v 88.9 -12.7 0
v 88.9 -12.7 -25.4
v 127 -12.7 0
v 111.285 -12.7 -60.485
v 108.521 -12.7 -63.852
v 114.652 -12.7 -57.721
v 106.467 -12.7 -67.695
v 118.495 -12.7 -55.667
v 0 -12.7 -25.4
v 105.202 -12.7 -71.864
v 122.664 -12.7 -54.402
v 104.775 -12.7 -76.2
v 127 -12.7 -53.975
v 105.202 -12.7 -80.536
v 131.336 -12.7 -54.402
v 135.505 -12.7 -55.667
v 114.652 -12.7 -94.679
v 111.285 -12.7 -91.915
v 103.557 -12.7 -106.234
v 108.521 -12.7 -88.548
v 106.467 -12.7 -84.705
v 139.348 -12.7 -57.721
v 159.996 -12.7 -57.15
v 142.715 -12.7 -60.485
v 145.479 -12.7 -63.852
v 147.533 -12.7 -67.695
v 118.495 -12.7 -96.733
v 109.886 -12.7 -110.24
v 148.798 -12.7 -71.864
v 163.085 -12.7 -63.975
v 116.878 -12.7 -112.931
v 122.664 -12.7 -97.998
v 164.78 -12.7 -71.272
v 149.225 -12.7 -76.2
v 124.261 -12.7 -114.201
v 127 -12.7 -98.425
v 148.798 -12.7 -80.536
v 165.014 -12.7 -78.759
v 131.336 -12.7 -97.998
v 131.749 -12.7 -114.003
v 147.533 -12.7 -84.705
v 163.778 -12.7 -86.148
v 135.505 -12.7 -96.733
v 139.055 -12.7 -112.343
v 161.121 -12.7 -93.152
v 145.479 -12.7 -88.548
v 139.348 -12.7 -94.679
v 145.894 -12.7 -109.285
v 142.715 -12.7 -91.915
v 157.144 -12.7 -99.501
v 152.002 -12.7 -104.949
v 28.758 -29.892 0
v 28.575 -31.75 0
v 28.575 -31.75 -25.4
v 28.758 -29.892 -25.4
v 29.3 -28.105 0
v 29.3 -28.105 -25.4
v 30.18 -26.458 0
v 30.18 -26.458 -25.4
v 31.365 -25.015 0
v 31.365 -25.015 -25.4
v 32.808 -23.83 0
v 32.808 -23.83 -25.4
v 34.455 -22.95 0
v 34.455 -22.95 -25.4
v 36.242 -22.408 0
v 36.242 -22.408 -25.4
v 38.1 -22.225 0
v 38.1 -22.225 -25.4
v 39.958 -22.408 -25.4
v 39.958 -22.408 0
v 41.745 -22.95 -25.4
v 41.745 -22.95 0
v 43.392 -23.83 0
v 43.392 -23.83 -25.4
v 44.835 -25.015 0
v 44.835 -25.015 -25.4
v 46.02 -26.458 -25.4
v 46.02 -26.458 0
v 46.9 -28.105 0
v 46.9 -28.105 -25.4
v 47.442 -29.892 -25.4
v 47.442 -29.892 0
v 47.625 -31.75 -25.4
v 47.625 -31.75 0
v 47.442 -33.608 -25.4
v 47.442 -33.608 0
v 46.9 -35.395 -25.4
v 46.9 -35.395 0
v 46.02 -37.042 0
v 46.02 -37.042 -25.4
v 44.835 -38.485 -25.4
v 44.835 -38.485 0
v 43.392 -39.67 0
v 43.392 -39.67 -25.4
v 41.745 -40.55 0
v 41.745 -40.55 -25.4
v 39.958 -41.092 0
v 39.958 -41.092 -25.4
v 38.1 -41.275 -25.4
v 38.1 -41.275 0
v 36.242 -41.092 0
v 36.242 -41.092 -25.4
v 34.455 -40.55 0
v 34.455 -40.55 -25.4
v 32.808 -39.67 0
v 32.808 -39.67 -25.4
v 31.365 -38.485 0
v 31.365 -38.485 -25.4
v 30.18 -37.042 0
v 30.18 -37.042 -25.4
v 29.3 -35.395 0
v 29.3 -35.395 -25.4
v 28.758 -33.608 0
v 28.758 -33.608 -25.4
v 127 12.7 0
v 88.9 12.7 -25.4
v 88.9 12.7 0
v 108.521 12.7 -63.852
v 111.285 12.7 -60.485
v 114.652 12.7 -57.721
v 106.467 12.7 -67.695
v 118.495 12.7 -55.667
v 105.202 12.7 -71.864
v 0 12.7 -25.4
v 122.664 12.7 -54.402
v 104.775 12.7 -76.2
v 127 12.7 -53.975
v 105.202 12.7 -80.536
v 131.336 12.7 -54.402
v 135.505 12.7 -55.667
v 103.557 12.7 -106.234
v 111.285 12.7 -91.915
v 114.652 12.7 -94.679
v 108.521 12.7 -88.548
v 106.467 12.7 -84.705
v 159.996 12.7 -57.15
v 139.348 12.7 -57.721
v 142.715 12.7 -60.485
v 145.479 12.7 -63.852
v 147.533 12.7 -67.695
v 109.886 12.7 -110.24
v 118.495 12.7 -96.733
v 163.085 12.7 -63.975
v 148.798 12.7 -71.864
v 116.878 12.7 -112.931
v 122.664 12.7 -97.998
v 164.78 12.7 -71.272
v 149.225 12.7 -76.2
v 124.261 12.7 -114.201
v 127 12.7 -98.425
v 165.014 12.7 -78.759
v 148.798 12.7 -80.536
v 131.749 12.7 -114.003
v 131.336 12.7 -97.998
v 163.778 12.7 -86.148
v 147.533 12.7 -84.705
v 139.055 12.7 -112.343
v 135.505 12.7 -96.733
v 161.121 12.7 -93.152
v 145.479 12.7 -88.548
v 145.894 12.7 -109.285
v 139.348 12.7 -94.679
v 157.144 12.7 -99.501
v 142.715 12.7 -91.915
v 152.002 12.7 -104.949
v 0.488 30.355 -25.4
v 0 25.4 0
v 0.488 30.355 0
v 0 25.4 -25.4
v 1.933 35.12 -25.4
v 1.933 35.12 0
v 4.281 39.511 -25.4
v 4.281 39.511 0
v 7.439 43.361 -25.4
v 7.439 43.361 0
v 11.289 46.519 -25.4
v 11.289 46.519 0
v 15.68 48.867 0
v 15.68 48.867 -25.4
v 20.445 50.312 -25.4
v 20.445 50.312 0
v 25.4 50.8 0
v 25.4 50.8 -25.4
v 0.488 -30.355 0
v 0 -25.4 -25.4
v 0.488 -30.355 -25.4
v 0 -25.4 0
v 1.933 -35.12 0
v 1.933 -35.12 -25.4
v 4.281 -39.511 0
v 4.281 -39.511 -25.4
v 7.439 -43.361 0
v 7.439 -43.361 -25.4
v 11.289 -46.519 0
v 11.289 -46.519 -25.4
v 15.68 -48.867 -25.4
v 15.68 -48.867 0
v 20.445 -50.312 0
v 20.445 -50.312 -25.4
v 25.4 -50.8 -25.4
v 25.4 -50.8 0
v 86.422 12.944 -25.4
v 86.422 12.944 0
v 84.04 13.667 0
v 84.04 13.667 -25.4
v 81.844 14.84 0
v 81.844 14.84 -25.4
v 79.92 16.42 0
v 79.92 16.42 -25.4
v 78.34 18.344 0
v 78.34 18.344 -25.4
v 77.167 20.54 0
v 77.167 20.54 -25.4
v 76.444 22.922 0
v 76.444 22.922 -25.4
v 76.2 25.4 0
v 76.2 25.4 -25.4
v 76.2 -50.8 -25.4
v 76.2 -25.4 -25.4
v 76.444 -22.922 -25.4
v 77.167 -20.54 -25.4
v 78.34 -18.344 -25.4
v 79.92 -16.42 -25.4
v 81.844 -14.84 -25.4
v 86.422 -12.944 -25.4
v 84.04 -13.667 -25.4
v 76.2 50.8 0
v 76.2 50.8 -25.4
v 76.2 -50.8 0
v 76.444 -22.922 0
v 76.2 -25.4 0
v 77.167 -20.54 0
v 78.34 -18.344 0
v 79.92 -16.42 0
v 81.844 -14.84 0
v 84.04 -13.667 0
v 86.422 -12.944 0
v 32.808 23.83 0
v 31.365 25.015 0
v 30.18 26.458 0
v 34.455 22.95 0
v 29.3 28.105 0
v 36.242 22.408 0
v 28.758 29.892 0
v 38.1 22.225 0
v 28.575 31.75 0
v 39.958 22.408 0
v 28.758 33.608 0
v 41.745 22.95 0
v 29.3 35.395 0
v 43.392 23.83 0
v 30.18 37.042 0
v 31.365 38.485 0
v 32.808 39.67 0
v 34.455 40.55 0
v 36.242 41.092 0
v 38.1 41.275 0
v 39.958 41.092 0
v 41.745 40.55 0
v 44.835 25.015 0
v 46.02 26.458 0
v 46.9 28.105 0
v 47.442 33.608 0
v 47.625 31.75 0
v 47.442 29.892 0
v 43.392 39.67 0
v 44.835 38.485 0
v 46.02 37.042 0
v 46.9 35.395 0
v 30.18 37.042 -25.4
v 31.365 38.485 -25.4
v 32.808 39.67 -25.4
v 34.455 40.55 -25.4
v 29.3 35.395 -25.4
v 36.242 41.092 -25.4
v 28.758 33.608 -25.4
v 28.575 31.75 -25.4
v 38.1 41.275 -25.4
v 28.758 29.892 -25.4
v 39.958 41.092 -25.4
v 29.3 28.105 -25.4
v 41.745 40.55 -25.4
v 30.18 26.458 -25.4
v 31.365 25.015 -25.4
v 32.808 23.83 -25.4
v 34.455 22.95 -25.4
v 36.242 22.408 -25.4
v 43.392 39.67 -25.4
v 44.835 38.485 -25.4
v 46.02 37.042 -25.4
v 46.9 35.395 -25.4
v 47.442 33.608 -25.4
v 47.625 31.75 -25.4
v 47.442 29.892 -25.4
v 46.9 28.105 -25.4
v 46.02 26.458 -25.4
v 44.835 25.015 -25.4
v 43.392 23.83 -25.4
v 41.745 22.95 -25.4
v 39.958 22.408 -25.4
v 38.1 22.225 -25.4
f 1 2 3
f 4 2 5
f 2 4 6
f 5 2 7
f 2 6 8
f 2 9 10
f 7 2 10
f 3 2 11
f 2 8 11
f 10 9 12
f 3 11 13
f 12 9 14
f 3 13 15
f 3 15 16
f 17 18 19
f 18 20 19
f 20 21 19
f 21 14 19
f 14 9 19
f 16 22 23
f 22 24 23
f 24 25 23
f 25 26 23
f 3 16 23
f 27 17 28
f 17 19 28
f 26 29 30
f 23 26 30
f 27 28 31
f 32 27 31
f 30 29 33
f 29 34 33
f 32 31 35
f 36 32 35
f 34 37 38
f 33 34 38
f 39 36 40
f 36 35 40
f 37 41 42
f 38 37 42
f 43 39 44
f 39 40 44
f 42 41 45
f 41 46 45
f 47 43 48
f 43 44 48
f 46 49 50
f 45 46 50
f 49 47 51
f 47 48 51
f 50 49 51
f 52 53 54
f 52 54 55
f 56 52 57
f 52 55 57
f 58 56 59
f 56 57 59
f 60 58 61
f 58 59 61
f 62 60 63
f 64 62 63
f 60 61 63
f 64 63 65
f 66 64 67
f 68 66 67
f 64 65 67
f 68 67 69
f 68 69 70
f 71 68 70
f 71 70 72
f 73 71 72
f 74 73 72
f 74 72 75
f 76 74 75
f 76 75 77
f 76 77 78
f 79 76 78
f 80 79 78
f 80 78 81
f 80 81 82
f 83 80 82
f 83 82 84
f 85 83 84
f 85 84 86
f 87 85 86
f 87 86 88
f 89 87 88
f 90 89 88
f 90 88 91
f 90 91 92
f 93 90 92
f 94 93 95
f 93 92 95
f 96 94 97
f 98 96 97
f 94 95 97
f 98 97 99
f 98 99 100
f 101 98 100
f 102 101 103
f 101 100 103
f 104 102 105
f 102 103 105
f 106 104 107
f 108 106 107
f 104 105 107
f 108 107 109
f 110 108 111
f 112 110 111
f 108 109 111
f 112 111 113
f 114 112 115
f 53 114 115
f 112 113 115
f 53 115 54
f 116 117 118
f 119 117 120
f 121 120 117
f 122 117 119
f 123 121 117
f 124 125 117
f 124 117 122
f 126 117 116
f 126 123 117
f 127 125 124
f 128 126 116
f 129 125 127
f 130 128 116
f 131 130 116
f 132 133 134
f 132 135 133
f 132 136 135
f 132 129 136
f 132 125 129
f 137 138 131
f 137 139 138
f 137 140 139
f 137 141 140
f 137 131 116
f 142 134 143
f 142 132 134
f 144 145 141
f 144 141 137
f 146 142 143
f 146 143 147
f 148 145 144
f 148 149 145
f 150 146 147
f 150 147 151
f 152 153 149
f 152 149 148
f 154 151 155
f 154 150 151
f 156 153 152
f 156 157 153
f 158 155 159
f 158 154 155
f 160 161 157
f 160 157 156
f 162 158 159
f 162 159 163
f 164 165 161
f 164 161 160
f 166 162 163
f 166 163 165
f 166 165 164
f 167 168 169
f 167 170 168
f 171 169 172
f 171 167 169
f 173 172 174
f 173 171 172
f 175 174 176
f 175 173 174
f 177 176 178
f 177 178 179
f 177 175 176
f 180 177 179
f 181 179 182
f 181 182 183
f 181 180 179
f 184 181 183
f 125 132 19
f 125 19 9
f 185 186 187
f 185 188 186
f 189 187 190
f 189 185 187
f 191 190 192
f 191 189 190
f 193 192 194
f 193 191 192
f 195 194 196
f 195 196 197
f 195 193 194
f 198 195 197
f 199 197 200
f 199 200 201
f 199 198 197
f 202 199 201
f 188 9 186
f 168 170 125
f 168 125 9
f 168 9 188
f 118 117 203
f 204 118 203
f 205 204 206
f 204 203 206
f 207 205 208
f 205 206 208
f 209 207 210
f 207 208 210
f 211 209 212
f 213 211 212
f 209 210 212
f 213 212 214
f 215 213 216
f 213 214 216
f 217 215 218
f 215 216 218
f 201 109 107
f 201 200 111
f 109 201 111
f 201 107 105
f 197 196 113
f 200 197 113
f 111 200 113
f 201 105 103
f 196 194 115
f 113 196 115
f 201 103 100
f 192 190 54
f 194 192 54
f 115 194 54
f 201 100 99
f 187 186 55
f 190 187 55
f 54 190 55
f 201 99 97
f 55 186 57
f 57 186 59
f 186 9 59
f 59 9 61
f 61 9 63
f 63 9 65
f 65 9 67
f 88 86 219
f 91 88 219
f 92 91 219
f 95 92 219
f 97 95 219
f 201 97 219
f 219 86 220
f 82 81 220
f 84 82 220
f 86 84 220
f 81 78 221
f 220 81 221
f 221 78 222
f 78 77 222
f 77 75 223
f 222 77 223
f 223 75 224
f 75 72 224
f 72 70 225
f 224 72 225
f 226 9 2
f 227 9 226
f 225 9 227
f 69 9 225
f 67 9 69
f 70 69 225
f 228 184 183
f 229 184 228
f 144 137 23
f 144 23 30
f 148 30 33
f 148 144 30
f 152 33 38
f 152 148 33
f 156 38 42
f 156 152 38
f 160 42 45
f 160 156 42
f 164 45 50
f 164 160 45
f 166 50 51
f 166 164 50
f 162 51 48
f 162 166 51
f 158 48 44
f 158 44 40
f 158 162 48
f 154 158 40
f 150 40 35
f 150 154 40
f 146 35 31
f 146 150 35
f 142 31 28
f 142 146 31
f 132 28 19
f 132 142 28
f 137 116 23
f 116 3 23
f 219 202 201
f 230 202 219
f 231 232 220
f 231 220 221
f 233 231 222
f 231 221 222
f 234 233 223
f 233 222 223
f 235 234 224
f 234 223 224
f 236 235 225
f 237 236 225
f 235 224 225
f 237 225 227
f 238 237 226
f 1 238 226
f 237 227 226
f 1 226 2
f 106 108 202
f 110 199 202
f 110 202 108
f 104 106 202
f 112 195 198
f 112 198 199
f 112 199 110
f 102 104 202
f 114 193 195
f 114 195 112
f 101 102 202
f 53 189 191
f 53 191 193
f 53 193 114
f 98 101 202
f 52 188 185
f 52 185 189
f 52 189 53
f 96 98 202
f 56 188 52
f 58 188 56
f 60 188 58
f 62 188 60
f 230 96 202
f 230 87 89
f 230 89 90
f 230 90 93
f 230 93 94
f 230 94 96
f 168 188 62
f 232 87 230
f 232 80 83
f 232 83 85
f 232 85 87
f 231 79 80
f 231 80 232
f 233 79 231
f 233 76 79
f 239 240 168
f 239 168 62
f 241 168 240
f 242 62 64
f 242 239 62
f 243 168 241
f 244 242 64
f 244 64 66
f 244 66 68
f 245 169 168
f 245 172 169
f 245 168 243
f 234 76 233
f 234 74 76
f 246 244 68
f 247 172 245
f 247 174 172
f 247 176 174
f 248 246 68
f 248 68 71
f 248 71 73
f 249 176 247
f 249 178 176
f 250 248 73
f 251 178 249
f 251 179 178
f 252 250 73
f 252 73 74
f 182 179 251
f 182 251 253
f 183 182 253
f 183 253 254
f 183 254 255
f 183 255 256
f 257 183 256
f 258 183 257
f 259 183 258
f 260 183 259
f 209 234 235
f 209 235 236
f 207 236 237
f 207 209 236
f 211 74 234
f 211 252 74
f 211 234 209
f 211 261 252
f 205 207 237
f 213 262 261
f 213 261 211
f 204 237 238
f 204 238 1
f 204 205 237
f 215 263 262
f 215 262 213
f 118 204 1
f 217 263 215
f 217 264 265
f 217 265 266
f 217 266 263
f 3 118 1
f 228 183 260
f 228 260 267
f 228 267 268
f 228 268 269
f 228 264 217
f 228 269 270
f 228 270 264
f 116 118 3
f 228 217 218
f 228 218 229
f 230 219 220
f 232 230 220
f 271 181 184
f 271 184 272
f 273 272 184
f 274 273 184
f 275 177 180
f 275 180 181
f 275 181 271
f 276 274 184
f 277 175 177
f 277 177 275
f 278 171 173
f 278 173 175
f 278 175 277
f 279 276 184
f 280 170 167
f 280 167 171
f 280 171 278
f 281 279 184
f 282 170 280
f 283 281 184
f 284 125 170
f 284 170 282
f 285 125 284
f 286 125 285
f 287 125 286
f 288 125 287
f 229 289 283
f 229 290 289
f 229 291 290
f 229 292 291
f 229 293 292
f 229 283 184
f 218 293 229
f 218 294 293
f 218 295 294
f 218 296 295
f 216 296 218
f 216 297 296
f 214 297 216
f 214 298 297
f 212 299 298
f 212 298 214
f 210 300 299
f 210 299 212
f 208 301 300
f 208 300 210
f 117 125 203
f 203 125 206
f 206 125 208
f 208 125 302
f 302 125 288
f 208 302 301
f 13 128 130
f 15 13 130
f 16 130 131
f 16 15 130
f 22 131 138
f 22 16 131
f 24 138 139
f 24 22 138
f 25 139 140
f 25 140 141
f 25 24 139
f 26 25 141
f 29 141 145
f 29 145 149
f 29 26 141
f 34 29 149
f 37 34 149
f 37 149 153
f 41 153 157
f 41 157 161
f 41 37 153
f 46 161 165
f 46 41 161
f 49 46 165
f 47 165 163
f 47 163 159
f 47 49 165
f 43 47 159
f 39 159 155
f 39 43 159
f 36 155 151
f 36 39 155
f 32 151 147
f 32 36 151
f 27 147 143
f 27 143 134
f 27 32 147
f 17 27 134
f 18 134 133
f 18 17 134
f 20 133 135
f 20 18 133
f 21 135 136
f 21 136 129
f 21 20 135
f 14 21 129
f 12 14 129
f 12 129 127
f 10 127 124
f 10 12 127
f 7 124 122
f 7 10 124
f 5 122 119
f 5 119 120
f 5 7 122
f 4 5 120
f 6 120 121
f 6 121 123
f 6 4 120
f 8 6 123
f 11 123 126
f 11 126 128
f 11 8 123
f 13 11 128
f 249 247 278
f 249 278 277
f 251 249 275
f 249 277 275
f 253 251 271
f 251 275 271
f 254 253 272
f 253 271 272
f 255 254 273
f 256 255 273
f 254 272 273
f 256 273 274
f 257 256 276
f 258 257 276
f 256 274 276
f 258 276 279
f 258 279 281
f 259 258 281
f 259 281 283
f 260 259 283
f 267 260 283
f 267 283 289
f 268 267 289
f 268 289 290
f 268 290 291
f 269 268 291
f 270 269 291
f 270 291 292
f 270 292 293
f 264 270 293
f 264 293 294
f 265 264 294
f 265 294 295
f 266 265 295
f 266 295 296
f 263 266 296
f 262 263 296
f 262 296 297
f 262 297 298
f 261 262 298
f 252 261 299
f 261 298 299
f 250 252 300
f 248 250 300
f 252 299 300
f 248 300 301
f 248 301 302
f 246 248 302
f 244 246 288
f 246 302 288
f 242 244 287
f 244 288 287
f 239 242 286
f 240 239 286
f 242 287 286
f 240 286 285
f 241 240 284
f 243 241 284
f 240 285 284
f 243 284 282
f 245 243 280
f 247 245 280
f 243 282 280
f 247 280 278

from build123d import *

# Parameters (mm, degrees)
SKETCH1_R           = 38.1
SKETCH1_R_2         = 22.225
BOSS_EXTRUDE1_DEPTH = 12.7
SKETCH2_W           = 101.6
SKETCH2_H           = 25.4
BOSS_EXTRUDE2_DEPTH = 38.1
SKETCH3_R           = 12.7
CUT_EXTRUDE1_DEPTH  = 195.272643468
SKETCH4_R           = 9.525
CUT_EXTRUDE3_DEPTH  = 38.1
FILLET3_R           = 25.4
SKETCH6_W           = 101.6
SKETCH6_H           = 25.4
BOSS_EXTRUDE3_DEPTH = 38.1
SKETCH7_R           = 12.7
CUT_EXTRUDE4_DEPTH  = 195.272643468
SKETCH8_R           = 9.525
CUT_EXTRUDE5_DEPTH  = 195.272643468
FILLET4_R           = 25.4


with BuildPart() as part:
    # Sketch1 → Boss-Extrude1 (new, symmetric)
    # profile 1 of 2: a face of its own
    with BuildSketch(Plane(origin=(0, 0, 0), x_dir=(1, 0, 0), z_dir=(0, 1, 0))):
        with BuildLine():
            Line((0, 25.4), (0, 0))
            Line((0, 0), (127, 0))
            Line((127, 0), (159.995567884, 57.15))
            ThreePointArc((159.995567884, 57.15), (101.997796947, 47.451089716), (103.55657019, 106.233574525))
            Line((103.55657019, 106.233574525), (0, 25.4))
        make_face()
    # profile 2 of 2: a face of its own
    with BuildSketch(Plane(origin=(0, 0, 0), x_dir=(1, 0, 0), z_dir=(0, 1, 0))):
        with Locations((127, 76.2)):
            Circle(SKETCH1_R)
        with Locations(Location((127, 76.2, 0), (0, 0, 270))):
            Circle(SKETCH1_R_2, mode=Mode.SUBTRACT)
    extrude(amount=BOSS_EXTRUDE1_DEPTH, both=True)

    # Sketch2 → Boss-Extrude2 (add)
    with BuildSketch(Plane(origin=(0, 12.7, 0), x_dir=(1, 0, 0), z_dir=(0, 1, 0))):
        with Locations((50.8, 12.7)):
            Rectangle(SKETCH2_W, SKETCH2_H)
    extrude(amount=BOSS_EXTRUDE2_DEPTH)

    # Sketch3 → Cut-Extrude1 (cut, through all)
    with BuildSketch(Plane(origin=(0, 0, -25.4), x_dir=(-1, 0, 0), z_dir=(0, 0, -1))):
        with BuildLine():
            ThreePointArc((-101.6, 25.4), (-88.9, 38.1), (-76.2, 25.4))
            Line((-76.2, 25.4), (-76.2, 50.8))
            Line((-76.2, 50.8), (-101.6, 50.8))
            Line((-101.6, 50.8), (-101.6, 25.4))
        make_face()
        with Locations((-88.9, 25.4)):
            Circle(SKETCH3_R)
        with BuildLine():
            Line((-101.6, 12.7), (-88.9, 12.7))
            ThreePointArc((-88.9, 12.7), (-97.880256121, 16.419743879), (-101.6, 25.4))
            Line((-101.6, 25.4), (-101.6, 12.7))
        make_face()
    extrude(amount=-CUT_EXTRUDE1_DEPTH, mode=Mode.SUBTRACT)

    # Sketch4 → Cut-Extrude3 (cut)
    with BuildSketch(Plane(origin=(0, 0, -25.4), x_dir=(-1, 0, 0), z_dir=(0, 0, -1))):
        with Locations((-38.1, 31.75)):
            Circle(SKETCH4_R)
    extrude(amount=-CUT_EXTRUDE3_DEPTH, mode=Mode.SUBTRACT)

    # Fillet3
    fillet3_edges = [part.edges().sort_by_distance(p)[0] for p in [
        (0, 50.8, -12.7),
    ]]
    fillet(fillet3_edges, radius=FILLET3_R)

    # Sketch6 → Boss-Extrude3 (add)
    with BuildSketch(Plane.XZ.offset(12.7)):
        with Locations((50.8, -12.7)):
            Rectangle(SKETCH6_W, SKETCH6_H)
    extrude(amount=BOSS_EXTRUDE3_DEPTH)

    # Sketch7 → Cut-Extrude4 (cut, through all)
    with BuildSketch(Plane(origin=(0, 0, -25.4), x_dir=(-1, 0, 0), z_dir=(0, 0, -1))):
        with BuildLine():
            Line((-76.2, -50.8), (-76.2, -25.4))
            ThreePointArc((-76.2, -25.4), (-88.9, -38.1), (-101.6, -25.4))
            Line((-101.6, -25.4), (-101.6, -50.8))
            Line((-101.6, -50.8), (-76.2, -50.8))
        make_face()
        with Locations((-88.9, -25.4)):
            Circle(SKETCH7_R)
        with BuildLine():
            ThreePointArc((-101.6, -25.4), (-97.880256121, -16.419743879), (-88.9, -12.7))
            Line((-88.9, -12.7), (-101.6, -12.7))
            Line((-101.6, -12.7), (-101.6, -25.4))
        make_face()
    extrude(amount=-CUT_EXTRUDE4_DEPTH, mode=Mode.SUBTRACT)

    # Sketch8 → Cut-Extrude5 (cut, through all)
    with BuildSketch(Plane(origin=(0, 0, -25.4), x_dir=(-1, 0, 0), z_dir=(0, 0, -1))):
        with Locations((-38.1, -31.75)):
            Circle(SKETCH8_R)
    extrude(amount=-CUT_EXTRUDE5_DEPTH, mode=Mode.SUBTRACT)

    # Fillet4
    fillet4_edges = [part.edges().sort_by_distance(p)[0] for p in [
        (0, -50.8, -12.7),
    ]]
    fillet(fillet4_edges, radius=FILLET4_R)


solid = part.part
